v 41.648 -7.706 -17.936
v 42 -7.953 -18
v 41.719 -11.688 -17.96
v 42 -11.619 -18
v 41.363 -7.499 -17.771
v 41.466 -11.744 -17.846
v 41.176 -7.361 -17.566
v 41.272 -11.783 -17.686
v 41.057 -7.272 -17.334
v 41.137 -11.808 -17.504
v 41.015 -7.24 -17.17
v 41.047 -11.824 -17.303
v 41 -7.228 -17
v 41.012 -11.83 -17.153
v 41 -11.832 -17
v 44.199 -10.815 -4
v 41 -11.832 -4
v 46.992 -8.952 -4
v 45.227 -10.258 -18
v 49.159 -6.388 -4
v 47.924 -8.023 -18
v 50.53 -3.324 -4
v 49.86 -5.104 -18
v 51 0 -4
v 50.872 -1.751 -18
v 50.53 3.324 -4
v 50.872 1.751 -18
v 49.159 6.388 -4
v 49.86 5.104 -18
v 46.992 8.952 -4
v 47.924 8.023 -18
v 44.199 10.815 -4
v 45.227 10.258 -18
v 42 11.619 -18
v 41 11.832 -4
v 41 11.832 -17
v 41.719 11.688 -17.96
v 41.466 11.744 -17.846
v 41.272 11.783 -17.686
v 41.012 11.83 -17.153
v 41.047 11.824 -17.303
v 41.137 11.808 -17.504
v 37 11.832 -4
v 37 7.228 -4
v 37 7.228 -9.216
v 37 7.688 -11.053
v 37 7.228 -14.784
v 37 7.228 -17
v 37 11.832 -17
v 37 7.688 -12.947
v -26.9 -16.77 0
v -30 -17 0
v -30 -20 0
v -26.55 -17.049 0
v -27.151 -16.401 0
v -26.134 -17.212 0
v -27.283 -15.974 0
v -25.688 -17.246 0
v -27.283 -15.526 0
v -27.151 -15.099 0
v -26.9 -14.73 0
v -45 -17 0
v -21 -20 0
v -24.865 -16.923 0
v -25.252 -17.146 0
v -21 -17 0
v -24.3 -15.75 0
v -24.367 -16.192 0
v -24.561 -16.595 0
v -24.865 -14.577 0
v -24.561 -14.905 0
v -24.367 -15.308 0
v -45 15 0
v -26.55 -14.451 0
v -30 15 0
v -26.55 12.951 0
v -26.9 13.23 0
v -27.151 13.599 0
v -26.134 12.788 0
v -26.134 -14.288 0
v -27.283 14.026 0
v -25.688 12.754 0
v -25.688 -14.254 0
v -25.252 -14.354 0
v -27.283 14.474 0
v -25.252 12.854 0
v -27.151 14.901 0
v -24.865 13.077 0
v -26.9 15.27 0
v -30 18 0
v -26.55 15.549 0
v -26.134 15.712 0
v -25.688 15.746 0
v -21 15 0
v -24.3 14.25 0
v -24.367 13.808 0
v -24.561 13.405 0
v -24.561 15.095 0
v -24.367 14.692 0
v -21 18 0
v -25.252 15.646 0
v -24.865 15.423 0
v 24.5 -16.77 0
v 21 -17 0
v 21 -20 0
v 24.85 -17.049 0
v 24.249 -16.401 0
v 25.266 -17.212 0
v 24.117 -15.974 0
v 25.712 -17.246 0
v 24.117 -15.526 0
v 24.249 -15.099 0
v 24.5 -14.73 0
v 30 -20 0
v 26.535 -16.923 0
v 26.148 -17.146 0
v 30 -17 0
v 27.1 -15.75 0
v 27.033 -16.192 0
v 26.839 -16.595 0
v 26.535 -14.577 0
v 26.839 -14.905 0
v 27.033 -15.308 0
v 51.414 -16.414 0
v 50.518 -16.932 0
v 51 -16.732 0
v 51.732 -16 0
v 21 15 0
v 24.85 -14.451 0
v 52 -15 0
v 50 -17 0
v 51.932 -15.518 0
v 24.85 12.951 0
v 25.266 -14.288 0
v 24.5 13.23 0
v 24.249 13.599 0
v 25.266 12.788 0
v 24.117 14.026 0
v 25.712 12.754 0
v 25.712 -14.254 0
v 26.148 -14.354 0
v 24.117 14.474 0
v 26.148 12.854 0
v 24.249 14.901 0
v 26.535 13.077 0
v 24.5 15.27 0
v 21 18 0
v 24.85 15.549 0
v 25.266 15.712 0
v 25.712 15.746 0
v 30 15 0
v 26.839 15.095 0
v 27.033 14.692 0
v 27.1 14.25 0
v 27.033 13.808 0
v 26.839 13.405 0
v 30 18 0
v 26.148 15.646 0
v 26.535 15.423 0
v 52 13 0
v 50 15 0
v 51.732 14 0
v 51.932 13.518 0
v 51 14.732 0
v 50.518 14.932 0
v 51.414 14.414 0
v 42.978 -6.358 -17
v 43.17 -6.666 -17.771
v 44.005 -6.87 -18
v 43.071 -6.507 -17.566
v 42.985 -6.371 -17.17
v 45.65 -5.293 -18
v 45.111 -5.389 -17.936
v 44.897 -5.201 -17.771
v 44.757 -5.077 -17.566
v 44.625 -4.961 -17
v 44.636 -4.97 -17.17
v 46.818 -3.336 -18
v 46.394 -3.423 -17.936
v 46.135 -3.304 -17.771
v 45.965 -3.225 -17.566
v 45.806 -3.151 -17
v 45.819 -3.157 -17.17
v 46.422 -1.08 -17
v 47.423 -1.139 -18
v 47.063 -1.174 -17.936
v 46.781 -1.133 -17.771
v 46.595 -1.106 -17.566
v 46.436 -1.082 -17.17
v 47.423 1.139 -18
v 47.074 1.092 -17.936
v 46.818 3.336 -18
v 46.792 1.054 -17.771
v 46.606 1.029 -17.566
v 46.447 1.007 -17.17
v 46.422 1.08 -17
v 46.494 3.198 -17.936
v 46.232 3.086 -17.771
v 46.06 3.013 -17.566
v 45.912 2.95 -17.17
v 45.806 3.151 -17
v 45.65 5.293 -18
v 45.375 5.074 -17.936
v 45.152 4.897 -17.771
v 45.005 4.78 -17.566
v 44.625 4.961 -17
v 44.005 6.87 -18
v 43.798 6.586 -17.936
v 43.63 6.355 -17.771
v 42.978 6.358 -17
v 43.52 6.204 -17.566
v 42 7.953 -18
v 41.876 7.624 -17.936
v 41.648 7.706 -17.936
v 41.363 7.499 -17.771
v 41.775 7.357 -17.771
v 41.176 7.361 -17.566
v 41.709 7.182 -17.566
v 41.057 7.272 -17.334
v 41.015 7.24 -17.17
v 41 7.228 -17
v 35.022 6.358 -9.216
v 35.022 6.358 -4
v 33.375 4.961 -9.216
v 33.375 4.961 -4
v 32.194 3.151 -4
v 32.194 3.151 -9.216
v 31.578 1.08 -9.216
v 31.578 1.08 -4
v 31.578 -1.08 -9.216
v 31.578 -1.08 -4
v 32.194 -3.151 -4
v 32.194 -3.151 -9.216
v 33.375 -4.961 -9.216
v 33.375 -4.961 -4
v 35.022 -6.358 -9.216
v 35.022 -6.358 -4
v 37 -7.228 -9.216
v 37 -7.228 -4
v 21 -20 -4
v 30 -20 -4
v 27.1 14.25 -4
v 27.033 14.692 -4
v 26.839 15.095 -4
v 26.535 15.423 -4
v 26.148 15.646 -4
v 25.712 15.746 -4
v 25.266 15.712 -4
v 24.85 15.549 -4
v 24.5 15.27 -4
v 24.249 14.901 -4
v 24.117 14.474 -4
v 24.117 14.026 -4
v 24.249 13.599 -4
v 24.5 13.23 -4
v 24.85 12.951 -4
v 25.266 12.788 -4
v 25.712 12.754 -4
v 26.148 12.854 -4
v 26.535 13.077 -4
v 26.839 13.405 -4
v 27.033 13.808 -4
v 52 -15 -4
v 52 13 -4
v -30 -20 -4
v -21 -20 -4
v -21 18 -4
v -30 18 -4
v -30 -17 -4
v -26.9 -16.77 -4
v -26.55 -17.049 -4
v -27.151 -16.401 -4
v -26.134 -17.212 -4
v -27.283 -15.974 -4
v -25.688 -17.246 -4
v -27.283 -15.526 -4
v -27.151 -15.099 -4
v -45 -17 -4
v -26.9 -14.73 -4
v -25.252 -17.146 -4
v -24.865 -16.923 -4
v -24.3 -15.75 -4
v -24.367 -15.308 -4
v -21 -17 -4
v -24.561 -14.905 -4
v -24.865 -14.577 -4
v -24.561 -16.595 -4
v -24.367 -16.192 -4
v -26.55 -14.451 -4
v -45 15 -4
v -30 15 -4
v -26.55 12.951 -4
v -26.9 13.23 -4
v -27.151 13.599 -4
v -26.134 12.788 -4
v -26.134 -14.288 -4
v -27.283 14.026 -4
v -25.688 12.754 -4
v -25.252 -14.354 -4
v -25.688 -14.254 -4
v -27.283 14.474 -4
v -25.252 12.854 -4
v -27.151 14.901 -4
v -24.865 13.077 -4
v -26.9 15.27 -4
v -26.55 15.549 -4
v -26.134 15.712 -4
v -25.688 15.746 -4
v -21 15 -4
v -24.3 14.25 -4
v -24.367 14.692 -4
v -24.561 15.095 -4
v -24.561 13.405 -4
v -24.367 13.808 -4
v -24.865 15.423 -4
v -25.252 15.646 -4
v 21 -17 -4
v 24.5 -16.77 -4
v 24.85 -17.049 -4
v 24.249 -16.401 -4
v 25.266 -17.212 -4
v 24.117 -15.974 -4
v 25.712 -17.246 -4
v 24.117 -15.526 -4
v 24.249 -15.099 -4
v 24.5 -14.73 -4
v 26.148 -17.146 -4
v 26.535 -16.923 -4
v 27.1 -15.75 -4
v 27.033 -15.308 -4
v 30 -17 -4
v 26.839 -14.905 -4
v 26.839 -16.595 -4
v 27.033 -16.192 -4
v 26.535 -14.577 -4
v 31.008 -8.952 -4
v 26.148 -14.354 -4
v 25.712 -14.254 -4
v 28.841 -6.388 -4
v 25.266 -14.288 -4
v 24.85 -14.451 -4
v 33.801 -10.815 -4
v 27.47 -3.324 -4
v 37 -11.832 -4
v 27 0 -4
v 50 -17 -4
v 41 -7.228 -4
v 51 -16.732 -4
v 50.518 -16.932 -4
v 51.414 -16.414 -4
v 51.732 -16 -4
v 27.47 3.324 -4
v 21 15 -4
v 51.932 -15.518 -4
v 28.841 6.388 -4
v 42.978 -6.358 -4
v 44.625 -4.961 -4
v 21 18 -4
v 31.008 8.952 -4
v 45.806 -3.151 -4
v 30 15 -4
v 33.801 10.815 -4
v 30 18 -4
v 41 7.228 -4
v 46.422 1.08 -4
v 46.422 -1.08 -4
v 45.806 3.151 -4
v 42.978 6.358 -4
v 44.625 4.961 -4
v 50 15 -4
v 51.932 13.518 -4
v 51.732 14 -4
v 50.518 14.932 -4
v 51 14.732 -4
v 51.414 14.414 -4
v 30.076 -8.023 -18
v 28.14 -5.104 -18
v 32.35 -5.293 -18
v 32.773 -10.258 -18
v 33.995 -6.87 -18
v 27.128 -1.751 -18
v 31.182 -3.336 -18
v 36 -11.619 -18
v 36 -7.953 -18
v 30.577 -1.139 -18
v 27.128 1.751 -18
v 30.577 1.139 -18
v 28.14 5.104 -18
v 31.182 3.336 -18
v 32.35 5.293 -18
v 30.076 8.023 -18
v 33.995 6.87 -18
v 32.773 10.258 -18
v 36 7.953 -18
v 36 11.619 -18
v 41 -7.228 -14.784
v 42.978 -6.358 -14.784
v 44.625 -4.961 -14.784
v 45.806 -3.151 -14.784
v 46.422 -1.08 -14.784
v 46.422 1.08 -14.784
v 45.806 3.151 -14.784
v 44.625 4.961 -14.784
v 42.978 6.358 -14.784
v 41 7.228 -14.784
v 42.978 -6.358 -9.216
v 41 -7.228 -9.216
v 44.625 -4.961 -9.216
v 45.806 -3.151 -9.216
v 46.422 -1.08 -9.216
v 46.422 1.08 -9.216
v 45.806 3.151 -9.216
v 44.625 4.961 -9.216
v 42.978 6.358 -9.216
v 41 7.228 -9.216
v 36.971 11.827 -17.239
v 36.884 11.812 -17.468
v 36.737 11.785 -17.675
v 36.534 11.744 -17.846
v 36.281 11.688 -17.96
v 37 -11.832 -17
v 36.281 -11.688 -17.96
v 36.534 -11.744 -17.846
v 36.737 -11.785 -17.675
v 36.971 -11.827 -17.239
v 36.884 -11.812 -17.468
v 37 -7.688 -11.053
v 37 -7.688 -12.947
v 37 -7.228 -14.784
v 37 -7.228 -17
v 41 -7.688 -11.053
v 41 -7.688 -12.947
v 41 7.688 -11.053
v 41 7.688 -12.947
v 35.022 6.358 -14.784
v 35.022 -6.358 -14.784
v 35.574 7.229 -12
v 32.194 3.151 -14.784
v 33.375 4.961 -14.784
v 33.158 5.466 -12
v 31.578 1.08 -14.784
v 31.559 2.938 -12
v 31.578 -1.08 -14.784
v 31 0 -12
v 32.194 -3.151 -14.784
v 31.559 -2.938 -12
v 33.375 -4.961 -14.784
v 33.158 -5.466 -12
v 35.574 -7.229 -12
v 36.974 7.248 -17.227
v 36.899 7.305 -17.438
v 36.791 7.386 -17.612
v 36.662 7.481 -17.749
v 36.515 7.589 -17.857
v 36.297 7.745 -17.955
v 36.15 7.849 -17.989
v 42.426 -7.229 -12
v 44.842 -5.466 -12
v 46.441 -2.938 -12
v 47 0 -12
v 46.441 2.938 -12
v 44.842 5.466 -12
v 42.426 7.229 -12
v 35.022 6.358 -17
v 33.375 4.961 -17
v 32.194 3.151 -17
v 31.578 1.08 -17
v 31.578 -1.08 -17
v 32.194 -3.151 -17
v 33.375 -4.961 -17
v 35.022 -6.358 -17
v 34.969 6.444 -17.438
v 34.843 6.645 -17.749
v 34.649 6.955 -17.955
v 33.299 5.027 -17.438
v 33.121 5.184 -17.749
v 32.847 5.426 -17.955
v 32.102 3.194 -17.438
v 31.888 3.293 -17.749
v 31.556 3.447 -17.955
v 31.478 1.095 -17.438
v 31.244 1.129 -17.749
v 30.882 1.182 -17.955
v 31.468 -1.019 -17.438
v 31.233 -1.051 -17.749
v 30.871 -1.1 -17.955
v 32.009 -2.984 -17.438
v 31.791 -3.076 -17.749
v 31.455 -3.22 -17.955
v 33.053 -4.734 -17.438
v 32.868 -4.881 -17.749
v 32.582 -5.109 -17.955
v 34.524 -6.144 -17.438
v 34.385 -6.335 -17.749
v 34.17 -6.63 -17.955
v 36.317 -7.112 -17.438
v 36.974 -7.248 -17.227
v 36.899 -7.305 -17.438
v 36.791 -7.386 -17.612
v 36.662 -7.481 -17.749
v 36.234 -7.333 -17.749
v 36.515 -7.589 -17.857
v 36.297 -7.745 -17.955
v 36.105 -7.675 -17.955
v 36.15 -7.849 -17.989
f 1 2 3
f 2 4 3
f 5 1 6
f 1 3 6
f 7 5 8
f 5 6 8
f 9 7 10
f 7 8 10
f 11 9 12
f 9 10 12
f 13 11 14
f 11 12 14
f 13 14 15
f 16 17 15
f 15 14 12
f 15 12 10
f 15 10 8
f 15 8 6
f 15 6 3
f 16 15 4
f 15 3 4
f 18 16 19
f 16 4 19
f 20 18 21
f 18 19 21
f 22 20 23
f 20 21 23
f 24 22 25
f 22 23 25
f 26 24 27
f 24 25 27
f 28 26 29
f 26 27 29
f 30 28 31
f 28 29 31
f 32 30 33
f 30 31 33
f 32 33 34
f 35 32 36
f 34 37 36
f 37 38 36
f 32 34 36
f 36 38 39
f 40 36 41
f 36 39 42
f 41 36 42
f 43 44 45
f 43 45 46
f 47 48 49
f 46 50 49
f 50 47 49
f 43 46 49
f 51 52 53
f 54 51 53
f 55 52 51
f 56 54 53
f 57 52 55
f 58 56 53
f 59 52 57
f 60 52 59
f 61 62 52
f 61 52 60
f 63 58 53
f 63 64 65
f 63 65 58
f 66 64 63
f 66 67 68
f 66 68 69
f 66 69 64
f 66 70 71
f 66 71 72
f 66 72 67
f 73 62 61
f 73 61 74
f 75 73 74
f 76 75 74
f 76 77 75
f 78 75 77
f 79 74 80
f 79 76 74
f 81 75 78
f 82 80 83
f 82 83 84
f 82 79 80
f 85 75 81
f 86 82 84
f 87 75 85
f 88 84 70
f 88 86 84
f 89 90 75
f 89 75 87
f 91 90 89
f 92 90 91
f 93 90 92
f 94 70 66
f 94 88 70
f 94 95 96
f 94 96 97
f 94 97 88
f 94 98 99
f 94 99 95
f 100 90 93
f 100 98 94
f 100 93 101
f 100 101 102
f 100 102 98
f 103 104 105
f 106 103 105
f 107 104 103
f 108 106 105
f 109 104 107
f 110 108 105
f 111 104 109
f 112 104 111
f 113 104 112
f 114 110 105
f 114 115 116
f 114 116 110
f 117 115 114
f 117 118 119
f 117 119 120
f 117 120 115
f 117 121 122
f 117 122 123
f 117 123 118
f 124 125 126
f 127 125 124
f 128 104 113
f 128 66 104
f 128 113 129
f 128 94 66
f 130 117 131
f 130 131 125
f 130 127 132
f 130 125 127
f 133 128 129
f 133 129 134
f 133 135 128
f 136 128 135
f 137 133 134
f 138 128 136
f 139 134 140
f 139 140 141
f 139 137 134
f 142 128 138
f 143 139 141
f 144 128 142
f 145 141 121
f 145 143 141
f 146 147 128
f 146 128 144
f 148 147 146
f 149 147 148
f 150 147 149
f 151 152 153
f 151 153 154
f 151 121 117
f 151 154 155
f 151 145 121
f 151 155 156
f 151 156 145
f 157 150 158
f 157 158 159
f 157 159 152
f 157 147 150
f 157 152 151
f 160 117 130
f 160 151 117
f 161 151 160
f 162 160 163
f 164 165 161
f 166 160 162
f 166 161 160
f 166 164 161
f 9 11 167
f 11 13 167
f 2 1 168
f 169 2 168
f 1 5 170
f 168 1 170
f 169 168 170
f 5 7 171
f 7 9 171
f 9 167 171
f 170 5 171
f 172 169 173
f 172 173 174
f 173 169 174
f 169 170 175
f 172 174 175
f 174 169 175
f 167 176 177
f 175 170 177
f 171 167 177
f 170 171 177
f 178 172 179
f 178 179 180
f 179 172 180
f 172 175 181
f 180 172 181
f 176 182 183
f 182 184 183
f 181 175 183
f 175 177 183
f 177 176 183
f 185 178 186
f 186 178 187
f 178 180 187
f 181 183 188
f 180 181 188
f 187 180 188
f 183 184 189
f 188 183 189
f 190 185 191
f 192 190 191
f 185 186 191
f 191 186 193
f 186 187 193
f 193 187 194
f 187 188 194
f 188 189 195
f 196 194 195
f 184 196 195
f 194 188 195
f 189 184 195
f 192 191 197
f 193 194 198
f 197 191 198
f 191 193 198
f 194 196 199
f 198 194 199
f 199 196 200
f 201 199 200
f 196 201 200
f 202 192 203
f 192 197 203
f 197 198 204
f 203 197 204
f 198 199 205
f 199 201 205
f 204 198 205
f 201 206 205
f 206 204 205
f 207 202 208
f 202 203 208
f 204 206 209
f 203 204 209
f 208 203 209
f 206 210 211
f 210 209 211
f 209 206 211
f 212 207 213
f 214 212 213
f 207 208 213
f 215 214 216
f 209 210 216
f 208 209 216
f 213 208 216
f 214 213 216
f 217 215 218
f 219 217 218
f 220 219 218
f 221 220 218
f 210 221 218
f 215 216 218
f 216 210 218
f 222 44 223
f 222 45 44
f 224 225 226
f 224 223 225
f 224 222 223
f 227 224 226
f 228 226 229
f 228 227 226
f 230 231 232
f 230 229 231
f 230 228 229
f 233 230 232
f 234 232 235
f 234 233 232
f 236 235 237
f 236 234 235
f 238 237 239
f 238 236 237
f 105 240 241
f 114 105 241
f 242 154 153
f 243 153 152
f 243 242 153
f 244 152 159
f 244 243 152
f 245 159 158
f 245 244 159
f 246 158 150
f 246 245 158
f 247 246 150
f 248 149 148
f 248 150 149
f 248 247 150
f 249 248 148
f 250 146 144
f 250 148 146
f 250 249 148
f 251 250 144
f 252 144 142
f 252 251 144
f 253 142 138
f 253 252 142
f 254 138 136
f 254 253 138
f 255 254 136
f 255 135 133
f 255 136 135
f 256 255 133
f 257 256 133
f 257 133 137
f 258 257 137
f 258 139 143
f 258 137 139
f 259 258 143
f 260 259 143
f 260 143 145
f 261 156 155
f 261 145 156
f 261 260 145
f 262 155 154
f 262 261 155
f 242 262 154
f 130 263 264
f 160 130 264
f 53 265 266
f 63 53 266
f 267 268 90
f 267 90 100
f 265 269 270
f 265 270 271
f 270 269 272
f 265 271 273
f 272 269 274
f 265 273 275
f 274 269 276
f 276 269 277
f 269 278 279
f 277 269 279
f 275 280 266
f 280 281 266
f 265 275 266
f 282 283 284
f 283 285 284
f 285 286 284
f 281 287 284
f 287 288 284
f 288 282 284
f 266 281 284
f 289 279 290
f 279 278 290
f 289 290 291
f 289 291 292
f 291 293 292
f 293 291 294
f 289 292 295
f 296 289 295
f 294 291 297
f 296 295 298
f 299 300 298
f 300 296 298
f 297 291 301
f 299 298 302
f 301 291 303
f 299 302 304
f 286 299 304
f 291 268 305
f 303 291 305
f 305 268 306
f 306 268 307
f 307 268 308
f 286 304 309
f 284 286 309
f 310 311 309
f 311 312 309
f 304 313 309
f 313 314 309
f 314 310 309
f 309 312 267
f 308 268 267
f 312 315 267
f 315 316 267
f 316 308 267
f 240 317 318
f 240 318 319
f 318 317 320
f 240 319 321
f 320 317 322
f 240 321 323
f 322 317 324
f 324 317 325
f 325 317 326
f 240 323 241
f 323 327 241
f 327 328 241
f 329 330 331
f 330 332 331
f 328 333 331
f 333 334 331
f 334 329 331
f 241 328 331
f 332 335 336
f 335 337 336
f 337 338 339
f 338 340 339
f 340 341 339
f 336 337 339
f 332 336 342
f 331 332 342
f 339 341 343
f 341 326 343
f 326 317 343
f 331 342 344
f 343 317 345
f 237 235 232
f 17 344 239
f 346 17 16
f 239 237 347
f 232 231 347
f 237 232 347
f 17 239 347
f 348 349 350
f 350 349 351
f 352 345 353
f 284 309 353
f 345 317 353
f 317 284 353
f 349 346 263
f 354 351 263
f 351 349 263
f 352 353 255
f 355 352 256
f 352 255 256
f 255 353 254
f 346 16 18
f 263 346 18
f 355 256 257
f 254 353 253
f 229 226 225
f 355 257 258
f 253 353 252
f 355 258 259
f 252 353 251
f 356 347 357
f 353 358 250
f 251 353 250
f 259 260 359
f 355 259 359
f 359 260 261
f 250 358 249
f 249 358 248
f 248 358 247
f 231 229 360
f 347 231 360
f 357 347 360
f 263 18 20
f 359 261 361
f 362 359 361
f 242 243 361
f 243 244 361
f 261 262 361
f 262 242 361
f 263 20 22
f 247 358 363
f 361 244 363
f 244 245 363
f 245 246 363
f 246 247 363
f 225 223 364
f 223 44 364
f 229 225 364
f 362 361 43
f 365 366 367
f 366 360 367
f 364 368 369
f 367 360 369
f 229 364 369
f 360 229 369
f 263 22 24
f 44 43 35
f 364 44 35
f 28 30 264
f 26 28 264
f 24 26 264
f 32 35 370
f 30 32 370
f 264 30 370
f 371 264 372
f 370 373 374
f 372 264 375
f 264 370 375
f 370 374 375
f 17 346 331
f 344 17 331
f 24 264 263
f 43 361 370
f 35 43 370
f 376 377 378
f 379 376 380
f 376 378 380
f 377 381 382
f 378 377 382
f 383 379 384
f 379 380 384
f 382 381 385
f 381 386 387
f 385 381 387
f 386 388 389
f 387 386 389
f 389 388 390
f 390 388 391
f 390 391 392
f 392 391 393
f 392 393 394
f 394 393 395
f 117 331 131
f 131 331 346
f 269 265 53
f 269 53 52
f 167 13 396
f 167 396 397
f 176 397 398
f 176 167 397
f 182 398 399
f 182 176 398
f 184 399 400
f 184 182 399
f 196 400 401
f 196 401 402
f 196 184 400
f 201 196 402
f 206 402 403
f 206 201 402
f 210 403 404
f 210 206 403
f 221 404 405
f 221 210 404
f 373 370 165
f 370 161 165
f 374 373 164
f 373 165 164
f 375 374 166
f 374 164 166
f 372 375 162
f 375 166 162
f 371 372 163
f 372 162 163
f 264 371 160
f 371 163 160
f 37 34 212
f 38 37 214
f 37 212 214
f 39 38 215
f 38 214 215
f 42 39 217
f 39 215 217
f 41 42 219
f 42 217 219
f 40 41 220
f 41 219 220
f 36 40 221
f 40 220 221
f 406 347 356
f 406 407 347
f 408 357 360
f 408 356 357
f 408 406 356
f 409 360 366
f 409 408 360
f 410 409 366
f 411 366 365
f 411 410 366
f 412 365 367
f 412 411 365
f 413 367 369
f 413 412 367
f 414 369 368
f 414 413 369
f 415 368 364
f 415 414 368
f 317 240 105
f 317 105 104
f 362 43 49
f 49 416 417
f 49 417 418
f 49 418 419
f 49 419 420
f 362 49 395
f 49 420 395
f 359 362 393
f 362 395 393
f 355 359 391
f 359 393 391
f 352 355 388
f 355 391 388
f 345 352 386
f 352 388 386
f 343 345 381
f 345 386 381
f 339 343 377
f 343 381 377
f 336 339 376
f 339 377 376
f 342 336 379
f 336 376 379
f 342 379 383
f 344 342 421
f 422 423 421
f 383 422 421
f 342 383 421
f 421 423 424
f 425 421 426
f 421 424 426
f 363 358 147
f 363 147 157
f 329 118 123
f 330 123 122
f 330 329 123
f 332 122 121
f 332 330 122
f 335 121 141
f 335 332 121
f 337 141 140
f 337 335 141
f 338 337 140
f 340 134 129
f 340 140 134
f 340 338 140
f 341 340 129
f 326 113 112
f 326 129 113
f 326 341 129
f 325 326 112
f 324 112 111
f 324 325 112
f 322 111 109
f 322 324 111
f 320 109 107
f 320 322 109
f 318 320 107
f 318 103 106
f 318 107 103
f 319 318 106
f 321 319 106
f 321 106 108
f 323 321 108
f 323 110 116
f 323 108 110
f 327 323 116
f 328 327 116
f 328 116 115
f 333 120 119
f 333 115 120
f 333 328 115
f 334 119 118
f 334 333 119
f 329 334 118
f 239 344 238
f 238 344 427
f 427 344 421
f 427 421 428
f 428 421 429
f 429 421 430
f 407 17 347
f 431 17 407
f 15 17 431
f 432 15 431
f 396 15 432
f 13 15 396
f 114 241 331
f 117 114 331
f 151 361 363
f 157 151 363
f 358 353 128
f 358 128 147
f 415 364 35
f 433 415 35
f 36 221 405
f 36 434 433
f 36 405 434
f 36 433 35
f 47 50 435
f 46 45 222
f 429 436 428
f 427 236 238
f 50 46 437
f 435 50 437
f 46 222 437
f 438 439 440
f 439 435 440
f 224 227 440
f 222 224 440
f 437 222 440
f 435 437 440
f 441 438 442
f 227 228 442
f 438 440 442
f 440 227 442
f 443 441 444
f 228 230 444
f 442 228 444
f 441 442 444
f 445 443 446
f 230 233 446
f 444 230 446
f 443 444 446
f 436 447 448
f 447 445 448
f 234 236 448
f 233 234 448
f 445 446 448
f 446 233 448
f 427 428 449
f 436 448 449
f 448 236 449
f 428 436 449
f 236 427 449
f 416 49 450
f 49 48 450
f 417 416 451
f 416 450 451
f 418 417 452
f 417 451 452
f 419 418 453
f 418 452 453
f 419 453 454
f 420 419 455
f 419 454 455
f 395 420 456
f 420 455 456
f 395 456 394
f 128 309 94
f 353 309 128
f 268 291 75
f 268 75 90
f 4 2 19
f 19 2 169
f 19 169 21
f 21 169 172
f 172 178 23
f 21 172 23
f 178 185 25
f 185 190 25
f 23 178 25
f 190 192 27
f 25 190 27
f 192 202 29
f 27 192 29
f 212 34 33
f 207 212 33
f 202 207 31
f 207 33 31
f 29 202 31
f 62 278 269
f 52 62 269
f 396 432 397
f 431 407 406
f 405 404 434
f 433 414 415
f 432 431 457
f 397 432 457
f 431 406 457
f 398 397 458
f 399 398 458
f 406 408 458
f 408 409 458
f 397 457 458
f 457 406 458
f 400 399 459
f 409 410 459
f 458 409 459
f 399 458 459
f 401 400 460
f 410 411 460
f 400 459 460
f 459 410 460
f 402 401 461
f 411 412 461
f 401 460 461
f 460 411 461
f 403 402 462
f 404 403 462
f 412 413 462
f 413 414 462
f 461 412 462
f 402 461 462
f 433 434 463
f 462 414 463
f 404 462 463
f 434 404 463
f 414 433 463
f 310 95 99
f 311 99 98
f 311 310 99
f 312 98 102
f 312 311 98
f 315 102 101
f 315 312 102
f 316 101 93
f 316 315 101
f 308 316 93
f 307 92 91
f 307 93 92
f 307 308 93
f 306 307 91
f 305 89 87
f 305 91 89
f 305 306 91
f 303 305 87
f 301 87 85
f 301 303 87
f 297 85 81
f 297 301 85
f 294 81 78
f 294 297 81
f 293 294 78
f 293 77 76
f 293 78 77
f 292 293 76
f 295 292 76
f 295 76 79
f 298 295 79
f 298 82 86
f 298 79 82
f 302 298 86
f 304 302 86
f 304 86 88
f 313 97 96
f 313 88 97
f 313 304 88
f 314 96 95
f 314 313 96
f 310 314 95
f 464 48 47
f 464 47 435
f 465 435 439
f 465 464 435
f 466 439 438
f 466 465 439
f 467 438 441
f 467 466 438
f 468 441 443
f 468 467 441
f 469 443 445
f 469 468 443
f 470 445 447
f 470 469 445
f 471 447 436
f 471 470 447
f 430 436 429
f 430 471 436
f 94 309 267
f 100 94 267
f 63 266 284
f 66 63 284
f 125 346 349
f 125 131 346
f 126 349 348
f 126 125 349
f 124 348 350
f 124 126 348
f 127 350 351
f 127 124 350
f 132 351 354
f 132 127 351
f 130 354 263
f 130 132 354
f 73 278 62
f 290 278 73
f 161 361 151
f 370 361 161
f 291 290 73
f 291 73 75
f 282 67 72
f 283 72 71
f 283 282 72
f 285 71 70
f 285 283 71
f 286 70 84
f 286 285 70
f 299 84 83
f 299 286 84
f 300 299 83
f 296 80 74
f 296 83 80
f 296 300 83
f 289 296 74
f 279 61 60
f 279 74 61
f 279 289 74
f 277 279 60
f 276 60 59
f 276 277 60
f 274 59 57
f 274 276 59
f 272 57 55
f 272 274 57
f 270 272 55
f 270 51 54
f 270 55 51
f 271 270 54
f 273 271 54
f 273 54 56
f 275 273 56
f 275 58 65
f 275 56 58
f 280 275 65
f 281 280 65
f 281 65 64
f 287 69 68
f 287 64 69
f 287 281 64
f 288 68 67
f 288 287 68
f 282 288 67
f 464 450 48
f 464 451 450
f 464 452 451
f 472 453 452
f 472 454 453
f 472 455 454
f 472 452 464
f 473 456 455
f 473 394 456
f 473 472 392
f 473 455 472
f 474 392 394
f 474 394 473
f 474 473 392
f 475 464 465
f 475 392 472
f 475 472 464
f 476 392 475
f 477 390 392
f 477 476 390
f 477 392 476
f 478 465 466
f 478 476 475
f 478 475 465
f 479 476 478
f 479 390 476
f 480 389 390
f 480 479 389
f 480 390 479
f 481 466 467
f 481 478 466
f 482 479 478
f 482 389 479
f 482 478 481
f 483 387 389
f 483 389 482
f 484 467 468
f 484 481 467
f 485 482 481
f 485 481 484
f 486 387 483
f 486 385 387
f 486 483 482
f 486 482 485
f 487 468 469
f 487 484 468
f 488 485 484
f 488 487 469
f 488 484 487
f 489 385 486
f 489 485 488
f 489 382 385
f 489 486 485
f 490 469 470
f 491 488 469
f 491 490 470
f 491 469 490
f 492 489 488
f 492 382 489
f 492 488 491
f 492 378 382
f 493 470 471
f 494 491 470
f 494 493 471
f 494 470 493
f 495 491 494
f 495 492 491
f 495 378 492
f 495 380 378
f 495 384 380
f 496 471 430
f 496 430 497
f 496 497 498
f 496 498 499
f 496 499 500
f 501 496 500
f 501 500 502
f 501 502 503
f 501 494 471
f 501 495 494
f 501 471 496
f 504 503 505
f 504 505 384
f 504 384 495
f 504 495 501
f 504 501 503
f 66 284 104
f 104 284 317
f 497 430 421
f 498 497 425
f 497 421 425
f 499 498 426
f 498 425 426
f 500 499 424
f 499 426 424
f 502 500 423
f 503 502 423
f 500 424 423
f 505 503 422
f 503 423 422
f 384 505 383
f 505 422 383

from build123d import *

# Parameters (mm, degrees)
BOX032_W          = 4
BOX032_H          = 6
BOX032_DEPTH      = 16
BOX033_W          = 4
BOX033_H          = 6
BOX033_DEPTH      = 16
CYLINDER022_R     = 7.5
CYLINDER022_DEPTH = 14
CYLINDER021_R     = 12
CYLINDER021_DEPTH = 14
FILLET005_R       = 1
FILLET006_R       = 1
CYLINDER009_R     = 1.5
CYLINDER009_DEPTH = 6
CYLINDER010_R     = 1.5
CYLINDER010_DEPTH = 6
CYLINDER011_R     = 1.5
CYLINDER011_DEPTH = 6
CYLINDER008_R     = 1.5
CYLINDER008_DEPTH = 6
BOX028_W          = 9
BOX028_H          = 3
BOX028_DEPTH      = 4
BOX029_W          = 9
BOX029_H          = 3
BOX029_DEPTH      = 4
BOX026_W          = 9
BOX026_H          = 3
BOX026_DEPTH      = 4
BOX027_W          = 9
BOX027_H          = 3
BOX027_DEPTH      = 4
BOX025_W          = 97
BOX025_H          = 32
BOX025_DEPTH      = 4
FILLET008_R       = 2


with BuildPart() as esf_ra:
    # Sphere → Sphere (revolve)
    with BuildSketch(Plane(origin=(39, 0, -12), x_dir=(1, 0, 0), z_dir=(0, -1, 0))):
        with BuildLine():
            ThreePointArc((0, -8), (8, 0), (0, 8))
            Line((0, 8), (0, -8))
        make_face()
    revolve(axis=Axis((39, 0, -12), (0, 0, 1)))


with BuildPart() as cubo026:
    # Box032 → Box032 (new body)
    with BuildSketch(Plane(origin=(37, -12, -19), x_dir=(1, 0, 0), z_dir=(0, 0, 1))):
        with Locations((2, 3)):
            Rectangle(BOX032_W, BOX032_H)
    extrude(amount=BOX032_DEPTH)


with BuildPart() as cubo027:
    # Box033 → Box033 (new body)
    with BuildSketch(Plane(origin=(37, 6, -19), x_dir=(1, 0, 0), z_dir=(0, 0, 1))):
        with Locations((2, 3)):
            Rectangle(BOX033_W, BOX033_H)
    extrude(amount=BOX033_DEPTH)


with BuildPart() as cilindro022:
    # Cylinder022 → Cylinder022 (new body)
    with BuildSketch(Plane(origin=(39, 0, -18), x_dir=(1, 0, 0), z_dir=(0, 0, 1))):
        Circle(CYLINDER022_R)
    extrude(amount=CYLINDER022_DEPTH)


with BuildPart() as fillet006:
    # Cylinder021 → Cylinder021 (new body)
    with BuildSketch(Plane(origin=(39, 0, -18), x_dir=(1, 0, 0), z_dir=(0, 0, 1))):
        Circle(CYLINDER021_R)
    extrude(amount=CYLINDER021_DEPTH)

    # Cut041: cut Cilindro022
    add(cilindro022.part, mode=Mode.SUBTRACT)

    # Cut042: cut Cubo027
    add(cubo027.part, mode=Mode.SUBTRACT)

    # Cut043: cut Cubo026
    add(cubo026.part, mode=Mode.SUBTRACT)

    # Cut044: cut Esféra
    add(esf_ra.part, mode=Mode.SUBTRACT)

    # Fillet005
    fillet005_edges = [fillet006.edges().sort_by_distance(p)[0] for p in [
        (37, 9.530288, -18),
        (37, -9.530288, -18),
        (31.5, 0, -18),
    ]]
    fillet(fillet005_edges, radius=FILLET005_R)

    # Fillet006
    fillet006_edges = [fillet006.edges().sort_by_distance(p)[0] for p in [
        (41, 9.530288, -18),
        (44.968668, -4.541476, -18),
        (41, -9.530288, -18),
        (44.968668, 4.541476, -18),
    ]]
    fillet(fillet006_edges, radius=FILLET006_R)


with BuildPart() as esf_ra001:
    # Sphere001 → Sphere001 (revolve)
    with BuildSketch(Plane(origin=(39, 0, -12), x_dir=(1, 0, 0), z_dir=(0, -1, 0))):
        with BuildLine():
            ThreePointArc((0, -8), (8, 0), (0, 8))
            Line((0, 8), (0, -8))
        make_face()
    revolve(axis=Axis((39, 0, -12), (0, 0, 1)))


with BuildPart() as cilindro009:
    # Cylinder009 → Cylinder009 (new body)
    with BuildSketch(Plane(origin=(25.6, -15.75, -4), x_dir=(1, 0, 0), z_dir=(0, 0, 1))):
        Circle(CYLINDER009_R)
    extrude(amount=CYLINDER009_DEPTH)


with BuildPart() as cilindro010:
    # Cylinder010 → Cylinder010 (new body)
    with BuildSketch(Plane(origin=(-25.8, -15.75, -4), x_dir=(1, 0, 0), z_dir=(0, 0, 1))):
        Circle(CYLINDER010_R)
    extrude(amount=CYLINDER010_DEPTH)


with BuildPart() as cilindro011:
    # Cylinder011 → Cylinder011 (new body)
    with BuildSketch(Plane(origin=(-25.8, 14.25, -4), x_dir=(1, 0, 0), z_dir=(0, 0, 1))):
        Circle(CYLINDER011_R)
    extrude(amount=CYLINDER011_DEPTH)


with BuildPart() as cilindro008:
    # Cylinder008 → Cylinder008 (new body)
    with BuildSketch(Plane(origin=(25.6, 14.25, -4), x_dir=(1, 0, 0), z_dir=(0, 0, 1))):
        Circle(CYLINDER008_R)
    extrude(amount=CYLINDER008_DEPTH)


with BuildPart() as cubo022:
    # Box028 → Box028 (new body)
    with BuildSketch(Plane(origin=(21, 15, -4), x_dir=(1, 0, 0), z_dir=(0, 0, 1))):
        with Locations((4.5, 1.5)):
            Rectangle(BOX028_W, BOX028_H)
    extrude(amount=BOX028_DEPTH)


with BuildPart() as cubo023:
    # Box029 → Box029 (new body)
    with BuildSketch(Plane(origin=(21, -20, -4), x_dir=(1, 0, 0), z_dir=(0, 0, 1))):
        with Locations((4.5, 1.5)):
            Rectangle(BOX029_W, BOX029_H)
    extrude(amount=BOX029_DEPTH)


with BuildPart() as cubo020:
    # Box026 → Box026 (new body)
    with BuildSketch(Plane(origin=(-30, 15, -4), x_dir=(1, 0, 0), z_dir=(0, 0, 1))):
        with Locations((4.5, 1.5)):
            Rectangle(BOX026_W, BOX026_H)
    extrude(amount=BOX026_DEPTH)


with BuildPart() as cubo021:
    # Box027 → Box027 (new body)
    with BuildSketch(Plane(origin=(-30, -20, -4), x_dir=(1, 0, 0), z_dir=(0, 0, 1))):
        with Locations((4.5, 1.5)):
            Rectangle(BOX027_W, BOX027_H)
    extrude(amount=BOX027_DEPTH)


with BuildPart() as tapabateria:
    # Box025 → Box025 (new body)
    with BuildSketch(Plane(origin=(-45, -17, -4), x_dir=(1, 0, 0), z_dir=(0, 0, 1))):
        with Locations((48.5, 16)):
            Rectangle(BOX025_W, BOX025_H)
    extrude(amount=BOX025_DEPTH)

    # Fusion008: union Cubo020, Cubo021
    add(cubo020.part)
    add(cubo021.part)

    # Fusion009: union Cubo022, Cubo023
    add(cubo022.part)
    add(cubo023.part)

    # Cut021: cut Cilindro008
    add(cilindro008.part, mode=Mode.SUBTRACT)

    # Cut022: cut Cilindro011
    add(cilindro011.part, mode=Mode.SUBTRACT)

    # Cut023: cut Cilindro010
    add(cilindro010.part, mode=Mode.SUBTRACT)

    # Cut024: cut Cilindro009
    add(cilindro009.part, mode=Mode.SUBTRACT)

    # Cut040: cut Esféra001
    add(esf_ra001.part, mode=Mode.SUBTRACT)

    # Fusion010: union Fillet006
    add(fillet006.part)

    # Fillet008
    fillet008_edges = [tapabateria.edges().sort_by_distance(p)[0] for p in [
        (52, -17, -2),
        (52, 15, -2),
    ]]
    fillet(fillet008_edges, radius=FILLET008_R)


solid = tapabateria.part
